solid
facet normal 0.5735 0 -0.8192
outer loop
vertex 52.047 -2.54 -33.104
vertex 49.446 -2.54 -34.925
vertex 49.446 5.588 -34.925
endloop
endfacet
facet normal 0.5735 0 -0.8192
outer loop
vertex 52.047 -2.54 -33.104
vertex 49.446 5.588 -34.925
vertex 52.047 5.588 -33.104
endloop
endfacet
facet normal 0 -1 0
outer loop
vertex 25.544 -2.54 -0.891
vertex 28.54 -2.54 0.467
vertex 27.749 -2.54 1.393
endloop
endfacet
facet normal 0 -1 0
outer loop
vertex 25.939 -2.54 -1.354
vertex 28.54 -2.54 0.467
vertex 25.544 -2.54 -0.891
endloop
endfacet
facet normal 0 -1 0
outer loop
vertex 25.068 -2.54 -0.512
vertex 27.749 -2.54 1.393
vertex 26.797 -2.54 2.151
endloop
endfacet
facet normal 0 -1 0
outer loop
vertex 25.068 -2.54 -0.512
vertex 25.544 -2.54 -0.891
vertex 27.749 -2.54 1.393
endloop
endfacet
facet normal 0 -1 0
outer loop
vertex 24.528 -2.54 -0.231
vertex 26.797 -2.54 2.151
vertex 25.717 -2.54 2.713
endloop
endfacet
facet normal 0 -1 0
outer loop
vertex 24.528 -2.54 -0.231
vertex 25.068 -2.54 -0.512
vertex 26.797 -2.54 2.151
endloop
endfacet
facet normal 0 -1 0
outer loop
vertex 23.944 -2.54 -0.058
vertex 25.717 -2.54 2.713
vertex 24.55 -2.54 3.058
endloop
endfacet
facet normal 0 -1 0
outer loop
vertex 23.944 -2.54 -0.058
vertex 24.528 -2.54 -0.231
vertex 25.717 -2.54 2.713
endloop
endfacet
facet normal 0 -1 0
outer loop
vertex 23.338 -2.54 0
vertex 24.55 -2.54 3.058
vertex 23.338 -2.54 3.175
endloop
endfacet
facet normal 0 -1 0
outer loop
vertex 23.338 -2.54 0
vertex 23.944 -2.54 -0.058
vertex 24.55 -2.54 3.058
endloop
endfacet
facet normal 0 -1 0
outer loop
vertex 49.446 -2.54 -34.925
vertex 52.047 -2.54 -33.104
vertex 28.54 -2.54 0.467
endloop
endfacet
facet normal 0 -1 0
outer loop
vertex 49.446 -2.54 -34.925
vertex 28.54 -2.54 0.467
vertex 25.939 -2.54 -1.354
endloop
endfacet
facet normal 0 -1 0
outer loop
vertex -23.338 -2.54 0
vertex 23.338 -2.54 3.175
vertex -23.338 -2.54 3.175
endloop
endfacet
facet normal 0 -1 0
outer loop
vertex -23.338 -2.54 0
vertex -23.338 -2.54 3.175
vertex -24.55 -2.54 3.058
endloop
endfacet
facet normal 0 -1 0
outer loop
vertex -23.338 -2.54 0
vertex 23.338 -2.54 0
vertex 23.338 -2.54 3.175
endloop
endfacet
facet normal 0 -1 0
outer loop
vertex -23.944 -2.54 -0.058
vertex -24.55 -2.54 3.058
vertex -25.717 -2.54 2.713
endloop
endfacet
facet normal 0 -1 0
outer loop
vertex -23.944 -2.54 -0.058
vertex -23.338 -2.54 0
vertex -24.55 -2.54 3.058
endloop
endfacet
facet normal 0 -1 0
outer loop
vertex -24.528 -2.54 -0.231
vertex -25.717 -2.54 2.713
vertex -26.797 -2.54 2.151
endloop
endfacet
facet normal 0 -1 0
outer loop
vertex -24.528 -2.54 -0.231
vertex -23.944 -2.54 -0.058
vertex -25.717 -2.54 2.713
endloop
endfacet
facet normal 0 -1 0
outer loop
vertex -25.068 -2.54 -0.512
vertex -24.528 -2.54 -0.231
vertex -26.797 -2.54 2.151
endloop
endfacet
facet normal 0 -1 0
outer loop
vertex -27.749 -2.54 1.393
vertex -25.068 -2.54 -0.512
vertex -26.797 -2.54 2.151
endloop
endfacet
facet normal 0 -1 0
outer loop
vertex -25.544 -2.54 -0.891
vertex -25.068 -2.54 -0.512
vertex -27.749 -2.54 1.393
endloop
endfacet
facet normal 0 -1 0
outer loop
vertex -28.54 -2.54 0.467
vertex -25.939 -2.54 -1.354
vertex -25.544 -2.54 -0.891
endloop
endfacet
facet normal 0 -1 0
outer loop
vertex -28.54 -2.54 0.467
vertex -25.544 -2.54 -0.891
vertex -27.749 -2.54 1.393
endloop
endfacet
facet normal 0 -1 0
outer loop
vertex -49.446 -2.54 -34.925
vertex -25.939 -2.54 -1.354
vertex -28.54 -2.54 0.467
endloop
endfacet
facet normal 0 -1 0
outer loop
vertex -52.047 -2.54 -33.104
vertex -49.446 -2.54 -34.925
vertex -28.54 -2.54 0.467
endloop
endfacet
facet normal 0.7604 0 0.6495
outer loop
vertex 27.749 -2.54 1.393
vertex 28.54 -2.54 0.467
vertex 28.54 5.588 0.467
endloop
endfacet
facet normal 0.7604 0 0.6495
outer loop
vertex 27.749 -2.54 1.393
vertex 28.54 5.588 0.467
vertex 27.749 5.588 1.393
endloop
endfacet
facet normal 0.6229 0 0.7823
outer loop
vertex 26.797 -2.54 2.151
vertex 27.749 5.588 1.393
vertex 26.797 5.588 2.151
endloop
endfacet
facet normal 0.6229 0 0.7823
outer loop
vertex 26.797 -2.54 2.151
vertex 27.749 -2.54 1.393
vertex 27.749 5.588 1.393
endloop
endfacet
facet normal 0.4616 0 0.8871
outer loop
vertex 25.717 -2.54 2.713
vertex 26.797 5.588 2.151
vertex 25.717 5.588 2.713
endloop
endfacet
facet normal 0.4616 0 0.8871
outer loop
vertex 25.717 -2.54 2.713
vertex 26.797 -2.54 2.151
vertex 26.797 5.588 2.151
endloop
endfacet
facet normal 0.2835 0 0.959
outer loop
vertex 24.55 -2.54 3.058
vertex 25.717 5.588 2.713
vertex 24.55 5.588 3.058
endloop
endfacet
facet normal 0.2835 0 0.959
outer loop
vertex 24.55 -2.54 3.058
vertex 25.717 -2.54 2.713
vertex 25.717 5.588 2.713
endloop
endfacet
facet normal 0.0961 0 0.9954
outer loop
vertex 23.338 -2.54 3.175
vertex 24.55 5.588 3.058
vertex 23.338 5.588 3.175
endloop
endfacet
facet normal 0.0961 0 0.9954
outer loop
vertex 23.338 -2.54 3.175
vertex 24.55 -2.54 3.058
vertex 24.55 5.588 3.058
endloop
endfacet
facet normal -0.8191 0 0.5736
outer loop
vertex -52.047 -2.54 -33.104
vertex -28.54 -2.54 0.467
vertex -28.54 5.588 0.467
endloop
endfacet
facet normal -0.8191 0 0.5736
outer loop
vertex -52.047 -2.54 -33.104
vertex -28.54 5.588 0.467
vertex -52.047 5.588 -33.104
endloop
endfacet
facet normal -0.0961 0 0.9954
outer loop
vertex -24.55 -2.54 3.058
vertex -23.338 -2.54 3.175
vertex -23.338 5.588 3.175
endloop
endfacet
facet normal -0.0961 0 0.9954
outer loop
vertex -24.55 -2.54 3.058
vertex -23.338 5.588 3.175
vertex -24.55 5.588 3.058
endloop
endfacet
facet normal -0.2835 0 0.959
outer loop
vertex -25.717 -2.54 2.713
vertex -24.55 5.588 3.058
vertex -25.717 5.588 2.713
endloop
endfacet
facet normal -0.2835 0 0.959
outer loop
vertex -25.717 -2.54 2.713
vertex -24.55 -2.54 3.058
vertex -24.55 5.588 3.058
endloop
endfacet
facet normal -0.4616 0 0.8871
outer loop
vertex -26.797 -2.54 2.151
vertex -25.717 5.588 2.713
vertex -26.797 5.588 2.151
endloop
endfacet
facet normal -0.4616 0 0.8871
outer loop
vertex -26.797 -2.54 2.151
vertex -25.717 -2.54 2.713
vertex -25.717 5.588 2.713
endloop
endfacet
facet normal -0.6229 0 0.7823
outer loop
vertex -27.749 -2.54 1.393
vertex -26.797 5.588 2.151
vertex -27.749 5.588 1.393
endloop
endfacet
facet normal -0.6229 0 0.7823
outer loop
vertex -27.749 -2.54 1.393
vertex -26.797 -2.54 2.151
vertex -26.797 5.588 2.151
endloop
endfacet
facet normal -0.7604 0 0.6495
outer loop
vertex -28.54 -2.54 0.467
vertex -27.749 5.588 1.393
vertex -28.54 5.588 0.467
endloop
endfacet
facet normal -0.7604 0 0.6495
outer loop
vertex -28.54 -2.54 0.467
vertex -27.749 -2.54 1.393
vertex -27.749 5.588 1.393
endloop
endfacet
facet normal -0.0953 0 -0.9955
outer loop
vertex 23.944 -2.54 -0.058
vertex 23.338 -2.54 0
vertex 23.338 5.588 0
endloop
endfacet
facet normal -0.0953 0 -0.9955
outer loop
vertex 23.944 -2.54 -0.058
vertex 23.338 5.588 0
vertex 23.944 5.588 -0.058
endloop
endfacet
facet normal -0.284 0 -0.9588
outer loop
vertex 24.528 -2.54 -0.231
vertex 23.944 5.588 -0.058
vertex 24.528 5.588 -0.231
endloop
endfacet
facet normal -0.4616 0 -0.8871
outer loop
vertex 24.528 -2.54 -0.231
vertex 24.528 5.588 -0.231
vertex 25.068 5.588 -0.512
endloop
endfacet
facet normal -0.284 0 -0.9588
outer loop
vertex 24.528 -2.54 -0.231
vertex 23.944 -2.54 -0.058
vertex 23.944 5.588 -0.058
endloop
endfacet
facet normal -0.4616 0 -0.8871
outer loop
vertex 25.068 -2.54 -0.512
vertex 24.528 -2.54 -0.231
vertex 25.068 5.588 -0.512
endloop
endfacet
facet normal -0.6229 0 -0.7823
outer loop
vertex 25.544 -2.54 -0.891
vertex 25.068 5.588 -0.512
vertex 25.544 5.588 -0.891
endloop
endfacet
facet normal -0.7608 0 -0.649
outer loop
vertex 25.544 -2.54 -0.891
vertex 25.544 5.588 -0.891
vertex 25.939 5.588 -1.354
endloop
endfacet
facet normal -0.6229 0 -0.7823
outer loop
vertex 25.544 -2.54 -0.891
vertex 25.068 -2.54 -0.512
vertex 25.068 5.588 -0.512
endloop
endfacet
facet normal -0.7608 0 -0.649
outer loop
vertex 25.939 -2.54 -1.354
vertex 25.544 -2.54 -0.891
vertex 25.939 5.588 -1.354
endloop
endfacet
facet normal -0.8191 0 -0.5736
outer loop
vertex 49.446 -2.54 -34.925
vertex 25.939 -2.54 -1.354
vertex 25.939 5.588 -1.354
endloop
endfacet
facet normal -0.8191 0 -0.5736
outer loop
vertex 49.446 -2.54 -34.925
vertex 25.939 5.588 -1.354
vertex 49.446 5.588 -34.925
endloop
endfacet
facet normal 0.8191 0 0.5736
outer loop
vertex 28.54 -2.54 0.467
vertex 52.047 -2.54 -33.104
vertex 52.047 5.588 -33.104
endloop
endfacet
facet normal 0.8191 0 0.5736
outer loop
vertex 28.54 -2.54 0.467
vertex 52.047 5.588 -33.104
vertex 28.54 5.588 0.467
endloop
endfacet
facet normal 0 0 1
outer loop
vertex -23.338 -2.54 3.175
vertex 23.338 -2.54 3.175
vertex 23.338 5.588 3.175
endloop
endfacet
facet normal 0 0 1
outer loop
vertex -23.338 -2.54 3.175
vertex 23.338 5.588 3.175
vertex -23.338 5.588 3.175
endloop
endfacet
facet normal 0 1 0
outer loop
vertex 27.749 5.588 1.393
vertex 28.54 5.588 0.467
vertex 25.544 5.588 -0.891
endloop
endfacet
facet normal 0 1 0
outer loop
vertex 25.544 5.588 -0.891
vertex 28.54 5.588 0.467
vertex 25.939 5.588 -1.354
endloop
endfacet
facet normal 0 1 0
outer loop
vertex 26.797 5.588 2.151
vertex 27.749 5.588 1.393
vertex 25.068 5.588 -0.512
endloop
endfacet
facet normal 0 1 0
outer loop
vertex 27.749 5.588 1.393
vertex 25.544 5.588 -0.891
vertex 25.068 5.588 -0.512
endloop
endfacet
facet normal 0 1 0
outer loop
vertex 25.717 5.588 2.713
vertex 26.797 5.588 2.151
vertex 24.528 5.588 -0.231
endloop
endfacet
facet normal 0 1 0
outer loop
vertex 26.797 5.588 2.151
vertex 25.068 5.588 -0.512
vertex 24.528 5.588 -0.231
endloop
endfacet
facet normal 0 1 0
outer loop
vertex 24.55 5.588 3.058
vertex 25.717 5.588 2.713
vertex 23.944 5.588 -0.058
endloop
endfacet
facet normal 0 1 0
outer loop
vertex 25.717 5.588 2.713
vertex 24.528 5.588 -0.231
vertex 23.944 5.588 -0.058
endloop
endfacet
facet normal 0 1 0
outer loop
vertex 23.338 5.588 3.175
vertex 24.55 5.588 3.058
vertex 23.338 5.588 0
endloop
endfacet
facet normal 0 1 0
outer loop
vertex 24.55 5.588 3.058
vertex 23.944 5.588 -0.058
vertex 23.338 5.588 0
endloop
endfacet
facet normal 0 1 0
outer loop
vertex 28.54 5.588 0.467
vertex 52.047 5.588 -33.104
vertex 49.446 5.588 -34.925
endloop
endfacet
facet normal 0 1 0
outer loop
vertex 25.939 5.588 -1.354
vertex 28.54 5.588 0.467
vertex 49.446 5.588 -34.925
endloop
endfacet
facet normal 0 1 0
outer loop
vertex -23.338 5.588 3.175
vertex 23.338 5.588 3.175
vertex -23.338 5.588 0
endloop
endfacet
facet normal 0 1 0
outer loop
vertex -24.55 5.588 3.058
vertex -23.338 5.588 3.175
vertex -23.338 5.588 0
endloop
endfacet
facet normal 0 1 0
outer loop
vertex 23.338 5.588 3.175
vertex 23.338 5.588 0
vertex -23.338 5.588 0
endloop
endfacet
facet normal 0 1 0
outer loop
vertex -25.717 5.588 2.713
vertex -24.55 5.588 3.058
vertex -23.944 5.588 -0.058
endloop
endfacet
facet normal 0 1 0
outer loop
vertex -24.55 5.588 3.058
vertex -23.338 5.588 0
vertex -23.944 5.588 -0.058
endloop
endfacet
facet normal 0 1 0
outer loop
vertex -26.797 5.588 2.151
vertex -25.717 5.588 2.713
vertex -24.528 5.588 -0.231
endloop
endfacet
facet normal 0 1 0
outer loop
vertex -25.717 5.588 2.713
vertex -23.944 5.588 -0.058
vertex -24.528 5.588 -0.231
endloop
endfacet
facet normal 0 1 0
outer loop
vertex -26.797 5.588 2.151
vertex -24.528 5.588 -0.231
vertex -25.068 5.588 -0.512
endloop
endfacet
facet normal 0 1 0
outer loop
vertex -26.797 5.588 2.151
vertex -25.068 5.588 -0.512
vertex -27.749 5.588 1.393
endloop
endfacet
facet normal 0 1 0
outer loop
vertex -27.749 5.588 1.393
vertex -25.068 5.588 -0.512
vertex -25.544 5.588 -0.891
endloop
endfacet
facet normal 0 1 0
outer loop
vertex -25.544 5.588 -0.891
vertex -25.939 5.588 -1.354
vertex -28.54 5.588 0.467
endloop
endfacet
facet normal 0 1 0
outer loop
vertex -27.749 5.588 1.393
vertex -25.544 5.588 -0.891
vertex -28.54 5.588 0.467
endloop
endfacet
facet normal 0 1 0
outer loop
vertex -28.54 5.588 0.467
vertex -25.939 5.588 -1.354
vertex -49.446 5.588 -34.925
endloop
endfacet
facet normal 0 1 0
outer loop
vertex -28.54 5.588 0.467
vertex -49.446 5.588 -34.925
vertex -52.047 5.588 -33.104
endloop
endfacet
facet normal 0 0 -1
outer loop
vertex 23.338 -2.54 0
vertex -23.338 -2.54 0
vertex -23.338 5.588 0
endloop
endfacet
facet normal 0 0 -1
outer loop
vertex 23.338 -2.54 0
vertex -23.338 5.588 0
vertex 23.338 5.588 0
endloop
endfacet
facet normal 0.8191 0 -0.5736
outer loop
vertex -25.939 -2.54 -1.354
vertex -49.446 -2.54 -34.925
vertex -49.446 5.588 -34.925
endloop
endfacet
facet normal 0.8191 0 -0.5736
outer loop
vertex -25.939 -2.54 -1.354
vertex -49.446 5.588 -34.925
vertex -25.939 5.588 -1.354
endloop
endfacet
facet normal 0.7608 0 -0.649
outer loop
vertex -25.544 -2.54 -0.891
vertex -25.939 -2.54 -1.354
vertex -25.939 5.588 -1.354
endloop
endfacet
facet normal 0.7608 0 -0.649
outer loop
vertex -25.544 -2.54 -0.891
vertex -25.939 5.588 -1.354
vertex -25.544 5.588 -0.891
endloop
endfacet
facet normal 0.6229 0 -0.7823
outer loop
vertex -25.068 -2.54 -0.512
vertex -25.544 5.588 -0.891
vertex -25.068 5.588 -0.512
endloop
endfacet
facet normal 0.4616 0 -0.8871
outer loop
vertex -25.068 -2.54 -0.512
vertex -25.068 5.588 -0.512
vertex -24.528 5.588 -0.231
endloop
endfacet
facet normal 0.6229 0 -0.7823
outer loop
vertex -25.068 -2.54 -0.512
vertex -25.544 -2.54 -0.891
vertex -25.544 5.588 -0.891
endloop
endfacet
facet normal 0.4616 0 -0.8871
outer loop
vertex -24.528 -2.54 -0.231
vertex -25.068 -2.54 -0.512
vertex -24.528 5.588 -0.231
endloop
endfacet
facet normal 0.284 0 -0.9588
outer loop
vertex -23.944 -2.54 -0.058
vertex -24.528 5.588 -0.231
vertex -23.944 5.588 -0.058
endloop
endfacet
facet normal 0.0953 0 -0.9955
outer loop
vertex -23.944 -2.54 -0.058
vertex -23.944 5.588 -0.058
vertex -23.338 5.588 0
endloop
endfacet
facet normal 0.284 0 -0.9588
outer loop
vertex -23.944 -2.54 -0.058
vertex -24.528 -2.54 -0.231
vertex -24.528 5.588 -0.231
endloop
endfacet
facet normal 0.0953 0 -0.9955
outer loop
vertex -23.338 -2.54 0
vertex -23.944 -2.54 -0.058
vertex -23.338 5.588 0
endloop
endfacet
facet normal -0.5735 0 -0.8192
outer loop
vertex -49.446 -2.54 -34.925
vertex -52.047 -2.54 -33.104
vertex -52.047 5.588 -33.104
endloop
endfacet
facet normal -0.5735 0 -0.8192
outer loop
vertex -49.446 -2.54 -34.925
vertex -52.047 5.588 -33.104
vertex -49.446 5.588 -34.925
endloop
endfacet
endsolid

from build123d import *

# Parameters (mm, degrees)
BOSS_EXTRUDE1_DEPTH      = 5.588
BOSS_EXTRUDE1_DEPTH_BACK = 2.54


with BuildPart() as part:
    # Sketch1 → Boss-Extrude1 (new, two sides: drawn at the far end of the back side and taken through both)
    with BuildSketch(Plane(origin=(0, 0, 0), x_dir=(1, 0, 0), z_dir=(0, 1, 0)).offset(-BOSS_EXTRUDE1_DEPTH_BACK)):
        with BuildLine():
            Line((-49.445827732, 34.925), (-25.939086815, 1.353894815))
            ThreePointArc((-25.939086815, 1.353894815), (-24.804330922, 0.358740605), (-23.338279075, 0))
            Line((-23.338279075, 0), (23.338279075, 0))
            ThreePointArc((23.338279075, 0), (24.804330922, 0.358740605), (25.939086815, 1.353894815))
            Line((25.939086815, 1.353894815), (49.445827732, 34.925))
            Line((49.445827732, 34.925), (52.046635473, 33.103894815))
            Line((52.046635473, 33.103894815), (28.539894556, -0.467210371))
            ThreePointArc((28.539894556, -0.467210371), (26.270382769, -2.457518791), (23.338279075, -3.175))
            Line((23.338279075, -3.175), (-23.338279075, -3.175))
            ThreePointArc((-23.338279075, -3.175), (-26.270382769, -2.457518791), (-28.539894556, -0.467210371))
            Line((-28.539894556, -0.467210371), (-52.046635473, 33.103894815))
            Line((-52.046635473, 33.103894815), (-49.445827732, 34.925))
        make_face()
    extrude(amount=BOSS_EXTRUDE1_DEPTH + BOSS_EXTRUDE1_DEPTH_BACK)


solid = part.part
